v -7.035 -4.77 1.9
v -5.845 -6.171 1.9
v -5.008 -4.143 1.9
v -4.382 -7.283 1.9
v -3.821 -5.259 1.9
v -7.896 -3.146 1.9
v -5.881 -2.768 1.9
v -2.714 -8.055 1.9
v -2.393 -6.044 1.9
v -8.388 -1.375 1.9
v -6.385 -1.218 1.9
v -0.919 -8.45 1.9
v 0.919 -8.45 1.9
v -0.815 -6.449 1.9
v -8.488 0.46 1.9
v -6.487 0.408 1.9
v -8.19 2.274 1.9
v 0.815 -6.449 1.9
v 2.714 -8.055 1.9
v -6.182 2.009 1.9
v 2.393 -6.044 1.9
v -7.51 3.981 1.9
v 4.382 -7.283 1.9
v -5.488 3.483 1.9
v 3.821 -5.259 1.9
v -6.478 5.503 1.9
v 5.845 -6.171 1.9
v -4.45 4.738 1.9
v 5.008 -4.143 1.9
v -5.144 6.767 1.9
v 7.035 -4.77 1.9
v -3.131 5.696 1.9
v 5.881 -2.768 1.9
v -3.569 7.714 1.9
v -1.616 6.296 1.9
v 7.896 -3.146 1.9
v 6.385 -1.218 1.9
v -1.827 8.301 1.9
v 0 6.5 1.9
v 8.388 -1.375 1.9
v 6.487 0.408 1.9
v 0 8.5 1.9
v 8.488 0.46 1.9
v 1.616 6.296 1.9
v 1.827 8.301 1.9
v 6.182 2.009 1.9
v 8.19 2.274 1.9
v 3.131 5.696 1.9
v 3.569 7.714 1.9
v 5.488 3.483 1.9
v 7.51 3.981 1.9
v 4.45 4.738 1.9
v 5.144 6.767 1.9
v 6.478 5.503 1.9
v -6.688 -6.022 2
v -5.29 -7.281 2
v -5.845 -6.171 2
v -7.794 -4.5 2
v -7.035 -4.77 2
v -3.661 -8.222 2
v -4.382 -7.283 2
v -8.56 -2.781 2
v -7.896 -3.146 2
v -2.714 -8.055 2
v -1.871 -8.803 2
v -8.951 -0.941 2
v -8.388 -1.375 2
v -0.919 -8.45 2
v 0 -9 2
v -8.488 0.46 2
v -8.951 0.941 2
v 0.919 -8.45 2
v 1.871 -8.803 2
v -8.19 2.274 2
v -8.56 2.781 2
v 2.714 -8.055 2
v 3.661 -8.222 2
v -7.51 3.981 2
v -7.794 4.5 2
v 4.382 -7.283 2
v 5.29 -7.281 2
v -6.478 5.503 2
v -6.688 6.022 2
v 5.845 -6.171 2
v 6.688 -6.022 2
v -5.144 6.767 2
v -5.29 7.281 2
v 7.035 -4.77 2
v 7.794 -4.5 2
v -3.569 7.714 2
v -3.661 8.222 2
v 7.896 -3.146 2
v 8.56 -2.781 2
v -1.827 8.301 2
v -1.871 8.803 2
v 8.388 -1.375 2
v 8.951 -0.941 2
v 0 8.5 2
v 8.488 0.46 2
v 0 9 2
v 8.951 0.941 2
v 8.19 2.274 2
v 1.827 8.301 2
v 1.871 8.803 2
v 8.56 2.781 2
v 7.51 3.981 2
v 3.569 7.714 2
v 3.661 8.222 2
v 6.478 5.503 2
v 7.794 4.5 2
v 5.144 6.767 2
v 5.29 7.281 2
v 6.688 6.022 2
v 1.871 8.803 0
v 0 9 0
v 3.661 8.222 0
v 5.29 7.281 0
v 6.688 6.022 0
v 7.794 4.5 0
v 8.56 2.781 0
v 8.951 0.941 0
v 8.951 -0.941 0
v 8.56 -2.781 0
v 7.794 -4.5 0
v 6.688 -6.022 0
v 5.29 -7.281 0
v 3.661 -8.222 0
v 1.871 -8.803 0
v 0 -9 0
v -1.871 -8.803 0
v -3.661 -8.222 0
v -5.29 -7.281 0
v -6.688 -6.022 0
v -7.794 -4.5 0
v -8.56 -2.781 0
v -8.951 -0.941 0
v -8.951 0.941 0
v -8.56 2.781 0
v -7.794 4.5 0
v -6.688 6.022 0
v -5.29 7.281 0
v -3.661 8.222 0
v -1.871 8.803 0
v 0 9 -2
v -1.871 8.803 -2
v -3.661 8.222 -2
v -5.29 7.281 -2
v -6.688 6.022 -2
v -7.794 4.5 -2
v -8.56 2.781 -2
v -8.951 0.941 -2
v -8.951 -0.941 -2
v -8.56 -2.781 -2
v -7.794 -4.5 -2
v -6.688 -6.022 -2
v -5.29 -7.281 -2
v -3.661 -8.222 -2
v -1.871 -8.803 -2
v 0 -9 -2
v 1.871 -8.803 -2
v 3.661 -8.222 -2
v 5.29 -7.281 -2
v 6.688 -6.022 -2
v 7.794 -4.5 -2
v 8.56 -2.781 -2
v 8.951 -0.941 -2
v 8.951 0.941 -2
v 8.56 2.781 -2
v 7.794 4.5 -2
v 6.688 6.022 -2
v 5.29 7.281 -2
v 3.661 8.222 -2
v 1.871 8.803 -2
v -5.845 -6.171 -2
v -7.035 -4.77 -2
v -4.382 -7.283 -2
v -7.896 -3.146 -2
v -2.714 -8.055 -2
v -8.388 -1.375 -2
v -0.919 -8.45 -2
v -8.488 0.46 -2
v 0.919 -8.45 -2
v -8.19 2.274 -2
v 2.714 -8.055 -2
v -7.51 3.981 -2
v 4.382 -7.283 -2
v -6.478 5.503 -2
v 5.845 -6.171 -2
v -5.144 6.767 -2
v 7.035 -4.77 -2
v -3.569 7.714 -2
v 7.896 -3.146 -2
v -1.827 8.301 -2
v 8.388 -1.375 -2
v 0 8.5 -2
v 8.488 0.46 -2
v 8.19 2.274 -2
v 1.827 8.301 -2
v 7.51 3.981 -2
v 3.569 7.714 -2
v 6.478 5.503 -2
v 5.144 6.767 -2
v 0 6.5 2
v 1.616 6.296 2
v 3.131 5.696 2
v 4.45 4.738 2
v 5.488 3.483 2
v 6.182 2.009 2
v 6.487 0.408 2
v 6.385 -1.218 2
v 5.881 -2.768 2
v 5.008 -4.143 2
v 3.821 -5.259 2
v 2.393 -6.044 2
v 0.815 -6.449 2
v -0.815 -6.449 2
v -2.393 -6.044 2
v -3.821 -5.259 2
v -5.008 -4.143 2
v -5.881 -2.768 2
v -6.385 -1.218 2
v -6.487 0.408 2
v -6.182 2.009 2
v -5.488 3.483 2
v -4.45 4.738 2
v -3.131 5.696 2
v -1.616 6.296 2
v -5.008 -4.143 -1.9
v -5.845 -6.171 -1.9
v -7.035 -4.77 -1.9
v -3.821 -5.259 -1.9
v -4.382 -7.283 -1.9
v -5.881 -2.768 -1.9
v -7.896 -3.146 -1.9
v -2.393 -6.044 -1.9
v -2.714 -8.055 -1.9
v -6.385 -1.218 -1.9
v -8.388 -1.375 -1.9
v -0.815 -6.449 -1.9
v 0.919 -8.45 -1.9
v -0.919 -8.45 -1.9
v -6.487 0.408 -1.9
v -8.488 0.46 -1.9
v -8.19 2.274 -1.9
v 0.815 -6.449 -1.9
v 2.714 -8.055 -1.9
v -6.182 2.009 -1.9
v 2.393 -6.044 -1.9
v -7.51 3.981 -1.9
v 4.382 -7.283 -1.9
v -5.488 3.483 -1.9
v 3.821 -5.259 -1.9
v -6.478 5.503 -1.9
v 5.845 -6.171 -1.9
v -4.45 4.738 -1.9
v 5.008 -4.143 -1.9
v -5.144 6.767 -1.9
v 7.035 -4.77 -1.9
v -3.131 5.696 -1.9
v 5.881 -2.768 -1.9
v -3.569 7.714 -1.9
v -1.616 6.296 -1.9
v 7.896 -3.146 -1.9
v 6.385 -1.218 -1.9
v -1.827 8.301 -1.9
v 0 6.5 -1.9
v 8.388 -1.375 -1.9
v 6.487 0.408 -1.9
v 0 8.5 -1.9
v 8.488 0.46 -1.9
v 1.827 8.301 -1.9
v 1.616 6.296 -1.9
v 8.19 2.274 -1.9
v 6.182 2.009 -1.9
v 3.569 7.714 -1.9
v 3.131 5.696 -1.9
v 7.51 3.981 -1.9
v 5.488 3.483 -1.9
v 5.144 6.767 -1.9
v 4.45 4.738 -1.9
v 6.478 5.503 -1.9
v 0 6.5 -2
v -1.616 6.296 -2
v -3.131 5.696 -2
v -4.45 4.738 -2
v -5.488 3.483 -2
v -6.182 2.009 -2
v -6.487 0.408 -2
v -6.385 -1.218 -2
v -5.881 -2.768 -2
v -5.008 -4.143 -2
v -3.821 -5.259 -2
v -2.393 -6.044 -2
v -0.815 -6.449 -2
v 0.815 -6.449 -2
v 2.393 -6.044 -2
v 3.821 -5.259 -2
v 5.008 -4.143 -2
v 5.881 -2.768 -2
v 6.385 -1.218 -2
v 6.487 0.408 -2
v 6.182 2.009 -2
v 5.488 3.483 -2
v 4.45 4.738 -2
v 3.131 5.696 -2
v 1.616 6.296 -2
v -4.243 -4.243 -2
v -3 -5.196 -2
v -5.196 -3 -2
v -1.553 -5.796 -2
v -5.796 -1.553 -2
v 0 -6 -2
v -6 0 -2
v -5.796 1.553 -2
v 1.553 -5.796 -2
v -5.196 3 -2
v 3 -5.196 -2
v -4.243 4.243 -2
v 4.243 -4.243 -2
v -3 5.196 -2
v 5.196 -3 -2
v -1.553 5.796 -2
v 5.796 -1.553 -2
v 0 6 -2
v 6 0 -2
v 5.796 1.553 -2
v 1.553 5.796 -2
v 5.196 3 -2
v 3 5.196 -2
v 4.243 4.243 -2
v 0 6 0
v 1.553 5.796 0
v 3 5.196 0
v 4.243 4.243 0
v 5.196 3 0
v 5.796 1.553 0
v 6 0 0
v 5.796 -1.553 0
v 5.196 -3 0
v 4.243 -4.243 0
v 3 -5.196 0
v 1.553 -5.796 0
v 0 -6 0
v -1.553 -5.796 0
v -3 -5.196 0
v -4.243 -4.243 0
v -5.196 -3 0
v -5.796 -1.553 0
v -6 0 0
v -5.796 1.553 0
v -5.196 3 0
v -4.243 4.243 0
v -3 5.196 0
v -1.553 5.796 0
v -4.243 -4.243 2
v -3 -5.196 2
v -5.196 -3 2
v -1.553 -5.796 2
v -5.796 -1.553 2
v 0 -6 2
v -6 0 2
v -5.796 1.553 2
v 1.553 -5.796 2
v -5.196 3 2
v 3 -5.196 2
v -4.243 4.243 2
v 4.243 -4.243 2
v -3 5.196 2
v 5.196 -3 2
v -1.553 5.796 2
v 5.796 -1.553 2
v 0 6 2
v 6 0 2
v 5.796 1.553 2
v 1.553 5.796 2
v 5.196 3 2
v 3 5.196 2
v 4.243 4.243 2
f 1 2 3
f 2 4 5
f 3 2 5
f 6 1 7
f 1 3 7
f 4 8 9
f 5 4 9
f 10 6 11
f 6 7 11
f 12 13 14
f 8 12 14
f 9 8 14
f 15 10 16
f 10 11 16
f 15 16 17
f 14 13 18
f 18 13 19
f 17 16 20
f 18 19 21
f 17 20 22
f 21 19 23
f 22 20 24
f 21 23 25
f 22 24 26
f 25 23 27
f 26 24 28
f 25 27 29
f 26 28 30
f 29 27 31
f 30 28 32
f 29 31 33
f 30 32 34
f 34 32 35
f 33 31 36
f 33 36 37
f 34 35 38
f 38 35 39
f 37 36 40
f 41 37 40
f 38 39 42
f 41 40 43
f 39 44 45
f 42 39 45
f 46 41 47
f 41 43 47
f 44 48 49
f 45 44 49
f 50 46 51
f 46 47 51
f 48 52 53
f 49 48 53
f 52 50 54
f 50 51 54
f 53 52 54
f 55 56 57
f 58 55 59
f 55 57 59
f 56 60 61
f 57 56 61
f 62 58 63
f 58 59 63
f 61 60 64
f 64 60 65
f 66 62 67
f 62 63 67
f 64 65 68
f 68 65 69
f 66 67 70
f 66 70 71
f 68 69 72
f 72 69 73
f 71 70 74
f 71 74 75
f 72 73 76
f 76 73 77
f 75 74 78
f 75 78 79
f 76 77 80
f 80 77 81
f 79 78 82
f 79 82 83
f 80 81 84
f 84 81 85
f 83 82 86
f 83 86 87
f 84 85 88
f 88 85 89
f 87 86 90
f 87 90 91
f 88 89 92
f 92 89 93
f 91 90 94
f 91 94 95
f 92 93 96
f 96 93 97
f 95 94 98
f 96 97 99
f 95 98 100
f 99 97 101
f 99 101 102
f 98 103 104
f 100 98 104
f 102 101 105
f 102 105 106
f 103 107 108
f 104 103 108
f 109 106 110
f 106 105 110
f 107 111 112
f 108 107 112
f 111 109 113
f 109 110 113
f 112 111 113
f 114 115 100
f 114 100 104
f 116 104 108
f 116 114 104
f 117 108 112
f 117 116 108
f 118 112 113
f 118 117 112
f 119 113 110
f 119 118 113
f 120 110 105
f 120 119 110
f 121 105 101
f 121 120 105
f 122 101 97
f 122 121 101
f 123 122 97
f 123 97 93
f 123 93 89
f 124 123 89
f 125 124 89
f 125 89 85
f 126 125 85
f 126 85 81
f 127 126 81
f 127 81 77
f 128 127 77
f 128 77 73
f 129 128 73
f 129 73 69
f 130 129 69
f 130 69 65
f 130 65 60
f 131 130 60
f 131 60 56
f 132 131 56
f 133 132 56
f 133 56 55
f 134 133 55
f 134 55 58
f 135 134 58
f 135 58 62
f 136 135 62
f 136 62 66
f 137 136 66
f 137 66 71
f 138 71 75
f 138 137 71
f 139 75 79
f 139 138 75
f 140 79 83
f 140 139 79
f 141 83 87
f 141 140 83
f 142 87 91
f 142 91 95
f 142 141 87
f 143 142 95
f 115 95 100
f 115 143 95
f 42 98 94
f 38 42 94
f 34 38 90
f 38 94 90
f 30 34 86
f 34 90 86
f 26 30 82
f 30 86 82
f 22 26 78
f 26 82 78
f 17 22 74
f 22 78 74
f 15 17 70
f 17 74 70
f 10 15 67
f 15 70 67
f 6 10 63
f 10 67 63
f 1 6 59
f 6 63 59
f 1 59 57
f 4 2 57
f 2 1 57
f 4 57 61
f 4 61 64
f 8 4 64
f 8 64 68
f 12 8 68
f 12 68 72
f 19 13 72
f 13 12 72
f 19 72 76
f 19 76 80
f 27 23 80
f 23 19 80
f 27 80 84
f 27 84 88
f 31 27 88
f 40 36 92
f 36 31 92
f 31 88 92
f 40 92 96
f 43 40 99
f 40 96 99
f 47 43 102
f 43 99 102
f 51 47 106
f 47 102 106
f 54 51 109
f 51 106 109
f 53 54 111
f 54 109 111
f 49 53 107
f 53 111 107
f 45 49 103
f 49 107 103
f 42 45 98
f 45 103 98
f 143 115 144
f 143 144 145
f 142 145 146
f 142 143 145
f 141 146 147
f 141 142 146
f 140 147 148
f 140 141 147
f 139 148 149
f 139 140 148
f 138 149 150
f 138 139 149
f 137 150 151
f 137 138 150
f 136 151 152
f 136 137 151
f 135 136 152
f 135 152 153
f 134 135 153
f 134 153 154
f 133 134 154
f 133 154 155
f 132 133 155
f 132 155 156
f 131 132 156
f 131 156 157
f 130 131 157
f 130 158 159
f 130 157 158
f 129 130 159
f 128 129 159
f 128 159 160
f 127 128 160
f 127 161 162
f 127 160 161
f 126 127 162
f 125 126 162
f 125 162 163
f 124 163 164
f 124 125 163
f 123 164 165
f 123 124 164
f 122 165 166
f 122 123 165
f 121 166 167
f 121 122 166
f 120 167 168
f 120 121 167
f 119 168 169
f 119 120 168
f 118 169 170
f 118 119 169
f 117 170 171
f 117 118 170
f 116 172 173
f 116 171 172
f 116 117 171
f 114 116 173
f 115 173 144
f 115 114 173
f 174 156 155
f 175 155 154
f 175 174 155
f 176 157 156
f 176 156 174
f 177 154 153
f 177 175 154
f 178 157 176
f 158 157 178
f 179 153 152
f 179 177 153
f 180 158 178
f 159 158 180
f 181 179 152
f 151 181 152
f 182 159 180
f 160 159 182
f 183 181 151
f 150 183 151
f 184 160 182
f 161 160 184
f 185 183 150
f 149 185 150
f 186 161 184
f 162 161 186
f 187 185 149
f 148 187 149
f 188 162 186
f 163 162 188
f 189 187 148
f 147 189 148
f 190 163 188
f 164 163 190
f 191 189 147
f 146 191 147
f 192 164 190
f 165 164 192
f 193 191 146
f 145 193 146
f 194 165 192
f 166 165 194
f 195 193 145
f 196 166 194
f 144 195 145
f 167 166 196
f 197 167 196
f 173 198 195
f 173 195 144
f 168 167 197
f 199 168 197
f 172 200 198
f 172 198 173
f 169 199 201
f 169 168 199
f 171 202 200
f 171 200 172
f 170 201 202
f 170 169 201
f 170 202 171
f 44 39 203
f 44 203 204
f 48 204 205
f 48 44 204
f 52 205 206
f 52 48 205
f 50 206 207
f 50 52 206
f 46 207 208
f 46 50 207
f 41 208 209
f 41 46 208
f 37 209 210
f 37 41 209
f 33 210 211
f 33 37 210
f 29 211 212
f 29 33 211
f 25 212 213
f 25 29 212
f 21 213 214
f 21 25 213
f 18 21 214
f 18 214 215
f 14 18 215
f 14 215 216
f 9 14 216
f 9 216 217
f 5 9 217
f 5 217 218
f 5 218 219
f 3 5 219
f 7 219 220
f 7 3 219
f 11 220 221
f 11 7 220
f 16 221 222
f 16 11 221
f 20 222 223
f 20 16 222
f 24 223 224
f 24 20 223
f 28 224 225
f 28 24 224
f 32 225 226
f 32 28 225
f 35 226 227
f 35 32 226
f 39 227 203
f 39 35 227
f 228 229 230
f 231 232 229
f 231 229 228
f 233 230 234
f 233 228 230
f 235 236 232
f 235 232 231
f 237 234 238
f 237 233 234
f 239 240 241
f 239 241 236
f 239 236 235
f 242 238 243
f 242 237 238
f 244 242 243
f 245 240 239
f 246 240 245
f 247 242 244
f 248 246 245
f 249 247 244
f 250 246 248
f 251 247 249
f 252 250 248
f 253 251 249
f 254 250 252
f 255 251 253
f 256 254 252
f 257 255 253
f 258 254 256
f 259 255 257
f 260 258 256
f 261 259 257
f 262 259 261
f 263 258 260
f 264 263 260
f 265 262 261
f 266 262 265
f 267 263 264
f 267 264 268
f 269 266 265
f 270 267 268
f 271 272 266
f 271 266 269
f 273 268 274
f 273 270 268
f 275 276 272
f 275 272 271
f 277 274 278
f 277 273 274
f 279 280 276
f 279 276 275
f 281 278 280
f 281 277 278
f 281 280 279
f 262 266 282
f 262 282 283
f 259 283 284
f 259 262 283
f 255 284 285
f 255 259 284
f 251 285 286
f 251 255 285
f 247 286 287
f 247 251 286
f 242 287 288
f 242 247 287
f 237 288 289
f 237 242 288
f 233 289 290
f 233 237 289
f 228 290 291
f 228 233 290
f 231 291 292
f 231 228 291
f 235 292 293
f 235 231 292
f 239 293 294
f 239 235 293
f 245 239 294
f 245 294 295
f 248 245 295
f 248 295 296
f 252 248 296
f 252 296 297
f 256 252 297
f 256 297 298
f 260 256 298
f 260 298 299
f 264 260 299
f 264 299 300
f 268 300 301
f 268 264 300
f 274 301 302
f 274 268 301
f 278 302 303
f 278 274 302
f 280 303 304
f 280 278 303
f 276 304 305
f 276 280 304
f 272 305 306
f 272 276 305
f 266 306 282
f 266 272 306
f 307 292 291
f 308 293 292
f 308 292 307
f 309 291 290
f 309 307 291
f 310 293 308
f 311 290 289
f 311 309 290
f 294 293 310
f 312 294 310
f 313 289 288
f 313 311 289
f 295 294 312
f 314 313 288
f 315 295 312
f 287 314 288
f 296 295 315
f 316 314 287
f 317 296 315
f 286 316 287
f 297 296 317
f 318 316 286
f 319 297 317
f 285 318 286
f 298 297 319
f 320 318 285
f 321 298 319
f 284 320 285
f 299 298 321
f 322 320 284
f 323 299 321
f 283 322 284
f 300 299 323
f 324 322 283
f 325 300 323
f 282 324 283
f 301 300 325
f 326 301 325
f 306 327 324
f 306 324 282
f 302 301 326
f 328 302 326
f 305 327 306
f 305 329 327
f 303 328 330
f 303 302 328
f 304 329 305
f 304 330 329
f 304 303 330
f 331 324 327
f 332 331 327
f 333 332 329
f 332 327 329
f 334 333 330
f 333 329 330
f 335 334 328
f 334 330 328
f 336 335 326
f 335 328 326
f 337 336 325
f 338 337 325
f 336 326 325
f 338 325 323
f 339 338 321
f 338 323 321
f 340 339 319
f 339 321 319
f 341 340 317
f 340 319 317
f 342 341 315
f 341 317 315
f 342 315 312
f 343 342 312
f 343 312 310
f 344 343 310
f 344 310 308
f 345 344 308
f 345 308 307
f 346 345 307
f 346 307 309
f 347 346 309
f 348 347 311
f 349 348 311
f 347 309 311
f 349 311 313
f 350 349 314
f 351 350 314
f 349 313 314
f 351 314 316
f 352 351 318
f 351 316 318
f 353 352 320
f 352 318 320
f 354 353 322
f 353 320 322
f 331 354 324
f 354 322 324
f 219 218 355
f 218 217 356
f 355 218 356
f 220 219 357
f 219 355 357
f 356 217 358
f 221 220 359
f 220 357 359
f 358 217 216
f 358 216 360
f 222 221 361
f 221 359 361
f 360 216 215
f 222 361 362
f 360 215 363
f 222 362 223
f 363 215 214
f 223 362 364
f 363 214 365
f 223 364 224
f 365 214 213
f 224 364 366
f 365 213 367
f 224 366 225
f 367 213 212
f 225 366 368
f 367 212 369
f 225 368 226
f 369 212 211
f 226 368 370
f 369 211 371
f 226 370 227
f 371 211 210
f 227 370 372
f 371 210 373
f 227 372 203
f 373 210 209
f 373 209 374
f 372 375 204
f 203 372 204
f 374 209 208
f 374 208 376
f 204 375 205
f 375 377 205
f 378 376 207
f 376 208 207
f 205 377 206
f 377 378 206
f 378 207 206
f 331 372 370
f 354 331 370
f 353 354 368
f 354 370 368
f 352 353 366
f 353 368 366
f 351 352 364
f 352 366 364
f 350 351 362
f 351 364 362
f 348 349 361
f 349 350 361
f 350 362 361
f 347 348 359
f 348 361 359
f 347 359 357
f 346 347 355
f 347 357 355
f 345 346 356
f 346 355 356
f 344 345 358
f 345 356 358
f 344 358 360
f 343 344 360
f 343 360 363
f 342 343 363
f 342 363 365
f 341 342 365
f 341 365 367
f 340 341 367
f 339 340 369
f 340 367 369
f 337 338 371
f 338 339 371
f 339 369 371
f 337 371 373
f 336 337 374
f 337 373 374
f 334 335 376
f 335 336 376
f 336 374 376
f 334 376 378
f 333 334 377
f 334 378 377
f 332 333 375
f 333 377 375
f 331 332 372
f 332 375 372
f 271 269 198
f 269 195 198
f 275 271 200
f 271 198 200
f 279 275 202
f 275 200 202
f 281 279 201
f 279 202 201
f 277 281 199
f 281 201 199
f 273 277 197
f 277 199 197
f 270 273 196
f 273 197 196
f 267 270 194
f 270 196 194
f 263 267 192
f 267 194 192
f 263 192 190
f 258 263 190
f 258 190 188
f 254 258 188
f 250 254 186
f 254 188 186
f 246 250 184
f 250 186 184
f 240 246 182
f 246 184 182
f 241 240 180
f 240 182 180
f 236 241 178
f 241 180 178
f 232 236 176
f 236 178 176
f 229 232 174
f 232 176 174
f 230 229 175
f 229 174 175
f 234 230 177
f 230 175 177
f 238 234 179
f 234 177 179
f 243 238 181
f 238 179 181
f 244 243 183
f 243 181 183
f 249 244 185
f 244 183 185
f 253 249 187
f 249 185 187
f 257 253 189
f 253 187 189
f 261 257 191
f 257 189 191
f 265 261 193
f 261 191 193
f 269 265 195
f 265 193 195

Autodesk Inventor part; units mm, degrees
ref_plane "YZ Plane" through (0, 0, 0) normal (1, 0, 0) x (0, 1, 0)
ref_plane "XZ Plane" through (0, 0, 0) normal (0, 1, 0) x (-1, 0, 0)
ref_plane "XY Plane" through (0, 0, 0) normal (0, 0, 1) x (1, 0, 0)
sketch "Sketch1" plane through (0, 0, 0) normal (1, 0, 0) x (0, 1, 0)
  line L0 (0, 0) -> (0, -2.1848) construction
  line L1 (0, 0) -> (6, 0) construction
  line L2 (6, 0) -> (6, -2)
  line L3 (6, -2) -> (6.5, -2)
  line L4 (6.5, -2) -> (6.5, -1.9)
  line L5 (6.5, -1.9) -> (8.5, -1.9)
  line L6 (8.5, -1.9) -> (8.5, -2)
  line L7 (8.5, -2) -> (9, -2)
  line L8 (9, -2) -> (9, 0)
  line L9 (9, 0) -> (6, 0) construction
  line L10 (6, 0) -> (6, 2)
  line L11 (6, 2) -> (6.5, 2)
  line L12 (6.5, 2) -> (6.5, 1.9)
  line L13 (6.5, 1.9) -> (8.5, 1.9)
  line L14 (8.5, 1.9) -> (8.5, 2)
  line L15 (8.5, 2) -> (9, 2)
  line L16 (9, 2) -> (9, 0)
  dimension "d0" = 6
  dimension "d1" = 9
  dimension "d2" = 0.1
  dimension "d3" = 2
  dimension "d6" = 4
revolve "Revolution1" add sketch "Sketch1" angle 360 about axis through (0, 0, 0) along (0, 0, -1)
properties part number "6701 bearing"
